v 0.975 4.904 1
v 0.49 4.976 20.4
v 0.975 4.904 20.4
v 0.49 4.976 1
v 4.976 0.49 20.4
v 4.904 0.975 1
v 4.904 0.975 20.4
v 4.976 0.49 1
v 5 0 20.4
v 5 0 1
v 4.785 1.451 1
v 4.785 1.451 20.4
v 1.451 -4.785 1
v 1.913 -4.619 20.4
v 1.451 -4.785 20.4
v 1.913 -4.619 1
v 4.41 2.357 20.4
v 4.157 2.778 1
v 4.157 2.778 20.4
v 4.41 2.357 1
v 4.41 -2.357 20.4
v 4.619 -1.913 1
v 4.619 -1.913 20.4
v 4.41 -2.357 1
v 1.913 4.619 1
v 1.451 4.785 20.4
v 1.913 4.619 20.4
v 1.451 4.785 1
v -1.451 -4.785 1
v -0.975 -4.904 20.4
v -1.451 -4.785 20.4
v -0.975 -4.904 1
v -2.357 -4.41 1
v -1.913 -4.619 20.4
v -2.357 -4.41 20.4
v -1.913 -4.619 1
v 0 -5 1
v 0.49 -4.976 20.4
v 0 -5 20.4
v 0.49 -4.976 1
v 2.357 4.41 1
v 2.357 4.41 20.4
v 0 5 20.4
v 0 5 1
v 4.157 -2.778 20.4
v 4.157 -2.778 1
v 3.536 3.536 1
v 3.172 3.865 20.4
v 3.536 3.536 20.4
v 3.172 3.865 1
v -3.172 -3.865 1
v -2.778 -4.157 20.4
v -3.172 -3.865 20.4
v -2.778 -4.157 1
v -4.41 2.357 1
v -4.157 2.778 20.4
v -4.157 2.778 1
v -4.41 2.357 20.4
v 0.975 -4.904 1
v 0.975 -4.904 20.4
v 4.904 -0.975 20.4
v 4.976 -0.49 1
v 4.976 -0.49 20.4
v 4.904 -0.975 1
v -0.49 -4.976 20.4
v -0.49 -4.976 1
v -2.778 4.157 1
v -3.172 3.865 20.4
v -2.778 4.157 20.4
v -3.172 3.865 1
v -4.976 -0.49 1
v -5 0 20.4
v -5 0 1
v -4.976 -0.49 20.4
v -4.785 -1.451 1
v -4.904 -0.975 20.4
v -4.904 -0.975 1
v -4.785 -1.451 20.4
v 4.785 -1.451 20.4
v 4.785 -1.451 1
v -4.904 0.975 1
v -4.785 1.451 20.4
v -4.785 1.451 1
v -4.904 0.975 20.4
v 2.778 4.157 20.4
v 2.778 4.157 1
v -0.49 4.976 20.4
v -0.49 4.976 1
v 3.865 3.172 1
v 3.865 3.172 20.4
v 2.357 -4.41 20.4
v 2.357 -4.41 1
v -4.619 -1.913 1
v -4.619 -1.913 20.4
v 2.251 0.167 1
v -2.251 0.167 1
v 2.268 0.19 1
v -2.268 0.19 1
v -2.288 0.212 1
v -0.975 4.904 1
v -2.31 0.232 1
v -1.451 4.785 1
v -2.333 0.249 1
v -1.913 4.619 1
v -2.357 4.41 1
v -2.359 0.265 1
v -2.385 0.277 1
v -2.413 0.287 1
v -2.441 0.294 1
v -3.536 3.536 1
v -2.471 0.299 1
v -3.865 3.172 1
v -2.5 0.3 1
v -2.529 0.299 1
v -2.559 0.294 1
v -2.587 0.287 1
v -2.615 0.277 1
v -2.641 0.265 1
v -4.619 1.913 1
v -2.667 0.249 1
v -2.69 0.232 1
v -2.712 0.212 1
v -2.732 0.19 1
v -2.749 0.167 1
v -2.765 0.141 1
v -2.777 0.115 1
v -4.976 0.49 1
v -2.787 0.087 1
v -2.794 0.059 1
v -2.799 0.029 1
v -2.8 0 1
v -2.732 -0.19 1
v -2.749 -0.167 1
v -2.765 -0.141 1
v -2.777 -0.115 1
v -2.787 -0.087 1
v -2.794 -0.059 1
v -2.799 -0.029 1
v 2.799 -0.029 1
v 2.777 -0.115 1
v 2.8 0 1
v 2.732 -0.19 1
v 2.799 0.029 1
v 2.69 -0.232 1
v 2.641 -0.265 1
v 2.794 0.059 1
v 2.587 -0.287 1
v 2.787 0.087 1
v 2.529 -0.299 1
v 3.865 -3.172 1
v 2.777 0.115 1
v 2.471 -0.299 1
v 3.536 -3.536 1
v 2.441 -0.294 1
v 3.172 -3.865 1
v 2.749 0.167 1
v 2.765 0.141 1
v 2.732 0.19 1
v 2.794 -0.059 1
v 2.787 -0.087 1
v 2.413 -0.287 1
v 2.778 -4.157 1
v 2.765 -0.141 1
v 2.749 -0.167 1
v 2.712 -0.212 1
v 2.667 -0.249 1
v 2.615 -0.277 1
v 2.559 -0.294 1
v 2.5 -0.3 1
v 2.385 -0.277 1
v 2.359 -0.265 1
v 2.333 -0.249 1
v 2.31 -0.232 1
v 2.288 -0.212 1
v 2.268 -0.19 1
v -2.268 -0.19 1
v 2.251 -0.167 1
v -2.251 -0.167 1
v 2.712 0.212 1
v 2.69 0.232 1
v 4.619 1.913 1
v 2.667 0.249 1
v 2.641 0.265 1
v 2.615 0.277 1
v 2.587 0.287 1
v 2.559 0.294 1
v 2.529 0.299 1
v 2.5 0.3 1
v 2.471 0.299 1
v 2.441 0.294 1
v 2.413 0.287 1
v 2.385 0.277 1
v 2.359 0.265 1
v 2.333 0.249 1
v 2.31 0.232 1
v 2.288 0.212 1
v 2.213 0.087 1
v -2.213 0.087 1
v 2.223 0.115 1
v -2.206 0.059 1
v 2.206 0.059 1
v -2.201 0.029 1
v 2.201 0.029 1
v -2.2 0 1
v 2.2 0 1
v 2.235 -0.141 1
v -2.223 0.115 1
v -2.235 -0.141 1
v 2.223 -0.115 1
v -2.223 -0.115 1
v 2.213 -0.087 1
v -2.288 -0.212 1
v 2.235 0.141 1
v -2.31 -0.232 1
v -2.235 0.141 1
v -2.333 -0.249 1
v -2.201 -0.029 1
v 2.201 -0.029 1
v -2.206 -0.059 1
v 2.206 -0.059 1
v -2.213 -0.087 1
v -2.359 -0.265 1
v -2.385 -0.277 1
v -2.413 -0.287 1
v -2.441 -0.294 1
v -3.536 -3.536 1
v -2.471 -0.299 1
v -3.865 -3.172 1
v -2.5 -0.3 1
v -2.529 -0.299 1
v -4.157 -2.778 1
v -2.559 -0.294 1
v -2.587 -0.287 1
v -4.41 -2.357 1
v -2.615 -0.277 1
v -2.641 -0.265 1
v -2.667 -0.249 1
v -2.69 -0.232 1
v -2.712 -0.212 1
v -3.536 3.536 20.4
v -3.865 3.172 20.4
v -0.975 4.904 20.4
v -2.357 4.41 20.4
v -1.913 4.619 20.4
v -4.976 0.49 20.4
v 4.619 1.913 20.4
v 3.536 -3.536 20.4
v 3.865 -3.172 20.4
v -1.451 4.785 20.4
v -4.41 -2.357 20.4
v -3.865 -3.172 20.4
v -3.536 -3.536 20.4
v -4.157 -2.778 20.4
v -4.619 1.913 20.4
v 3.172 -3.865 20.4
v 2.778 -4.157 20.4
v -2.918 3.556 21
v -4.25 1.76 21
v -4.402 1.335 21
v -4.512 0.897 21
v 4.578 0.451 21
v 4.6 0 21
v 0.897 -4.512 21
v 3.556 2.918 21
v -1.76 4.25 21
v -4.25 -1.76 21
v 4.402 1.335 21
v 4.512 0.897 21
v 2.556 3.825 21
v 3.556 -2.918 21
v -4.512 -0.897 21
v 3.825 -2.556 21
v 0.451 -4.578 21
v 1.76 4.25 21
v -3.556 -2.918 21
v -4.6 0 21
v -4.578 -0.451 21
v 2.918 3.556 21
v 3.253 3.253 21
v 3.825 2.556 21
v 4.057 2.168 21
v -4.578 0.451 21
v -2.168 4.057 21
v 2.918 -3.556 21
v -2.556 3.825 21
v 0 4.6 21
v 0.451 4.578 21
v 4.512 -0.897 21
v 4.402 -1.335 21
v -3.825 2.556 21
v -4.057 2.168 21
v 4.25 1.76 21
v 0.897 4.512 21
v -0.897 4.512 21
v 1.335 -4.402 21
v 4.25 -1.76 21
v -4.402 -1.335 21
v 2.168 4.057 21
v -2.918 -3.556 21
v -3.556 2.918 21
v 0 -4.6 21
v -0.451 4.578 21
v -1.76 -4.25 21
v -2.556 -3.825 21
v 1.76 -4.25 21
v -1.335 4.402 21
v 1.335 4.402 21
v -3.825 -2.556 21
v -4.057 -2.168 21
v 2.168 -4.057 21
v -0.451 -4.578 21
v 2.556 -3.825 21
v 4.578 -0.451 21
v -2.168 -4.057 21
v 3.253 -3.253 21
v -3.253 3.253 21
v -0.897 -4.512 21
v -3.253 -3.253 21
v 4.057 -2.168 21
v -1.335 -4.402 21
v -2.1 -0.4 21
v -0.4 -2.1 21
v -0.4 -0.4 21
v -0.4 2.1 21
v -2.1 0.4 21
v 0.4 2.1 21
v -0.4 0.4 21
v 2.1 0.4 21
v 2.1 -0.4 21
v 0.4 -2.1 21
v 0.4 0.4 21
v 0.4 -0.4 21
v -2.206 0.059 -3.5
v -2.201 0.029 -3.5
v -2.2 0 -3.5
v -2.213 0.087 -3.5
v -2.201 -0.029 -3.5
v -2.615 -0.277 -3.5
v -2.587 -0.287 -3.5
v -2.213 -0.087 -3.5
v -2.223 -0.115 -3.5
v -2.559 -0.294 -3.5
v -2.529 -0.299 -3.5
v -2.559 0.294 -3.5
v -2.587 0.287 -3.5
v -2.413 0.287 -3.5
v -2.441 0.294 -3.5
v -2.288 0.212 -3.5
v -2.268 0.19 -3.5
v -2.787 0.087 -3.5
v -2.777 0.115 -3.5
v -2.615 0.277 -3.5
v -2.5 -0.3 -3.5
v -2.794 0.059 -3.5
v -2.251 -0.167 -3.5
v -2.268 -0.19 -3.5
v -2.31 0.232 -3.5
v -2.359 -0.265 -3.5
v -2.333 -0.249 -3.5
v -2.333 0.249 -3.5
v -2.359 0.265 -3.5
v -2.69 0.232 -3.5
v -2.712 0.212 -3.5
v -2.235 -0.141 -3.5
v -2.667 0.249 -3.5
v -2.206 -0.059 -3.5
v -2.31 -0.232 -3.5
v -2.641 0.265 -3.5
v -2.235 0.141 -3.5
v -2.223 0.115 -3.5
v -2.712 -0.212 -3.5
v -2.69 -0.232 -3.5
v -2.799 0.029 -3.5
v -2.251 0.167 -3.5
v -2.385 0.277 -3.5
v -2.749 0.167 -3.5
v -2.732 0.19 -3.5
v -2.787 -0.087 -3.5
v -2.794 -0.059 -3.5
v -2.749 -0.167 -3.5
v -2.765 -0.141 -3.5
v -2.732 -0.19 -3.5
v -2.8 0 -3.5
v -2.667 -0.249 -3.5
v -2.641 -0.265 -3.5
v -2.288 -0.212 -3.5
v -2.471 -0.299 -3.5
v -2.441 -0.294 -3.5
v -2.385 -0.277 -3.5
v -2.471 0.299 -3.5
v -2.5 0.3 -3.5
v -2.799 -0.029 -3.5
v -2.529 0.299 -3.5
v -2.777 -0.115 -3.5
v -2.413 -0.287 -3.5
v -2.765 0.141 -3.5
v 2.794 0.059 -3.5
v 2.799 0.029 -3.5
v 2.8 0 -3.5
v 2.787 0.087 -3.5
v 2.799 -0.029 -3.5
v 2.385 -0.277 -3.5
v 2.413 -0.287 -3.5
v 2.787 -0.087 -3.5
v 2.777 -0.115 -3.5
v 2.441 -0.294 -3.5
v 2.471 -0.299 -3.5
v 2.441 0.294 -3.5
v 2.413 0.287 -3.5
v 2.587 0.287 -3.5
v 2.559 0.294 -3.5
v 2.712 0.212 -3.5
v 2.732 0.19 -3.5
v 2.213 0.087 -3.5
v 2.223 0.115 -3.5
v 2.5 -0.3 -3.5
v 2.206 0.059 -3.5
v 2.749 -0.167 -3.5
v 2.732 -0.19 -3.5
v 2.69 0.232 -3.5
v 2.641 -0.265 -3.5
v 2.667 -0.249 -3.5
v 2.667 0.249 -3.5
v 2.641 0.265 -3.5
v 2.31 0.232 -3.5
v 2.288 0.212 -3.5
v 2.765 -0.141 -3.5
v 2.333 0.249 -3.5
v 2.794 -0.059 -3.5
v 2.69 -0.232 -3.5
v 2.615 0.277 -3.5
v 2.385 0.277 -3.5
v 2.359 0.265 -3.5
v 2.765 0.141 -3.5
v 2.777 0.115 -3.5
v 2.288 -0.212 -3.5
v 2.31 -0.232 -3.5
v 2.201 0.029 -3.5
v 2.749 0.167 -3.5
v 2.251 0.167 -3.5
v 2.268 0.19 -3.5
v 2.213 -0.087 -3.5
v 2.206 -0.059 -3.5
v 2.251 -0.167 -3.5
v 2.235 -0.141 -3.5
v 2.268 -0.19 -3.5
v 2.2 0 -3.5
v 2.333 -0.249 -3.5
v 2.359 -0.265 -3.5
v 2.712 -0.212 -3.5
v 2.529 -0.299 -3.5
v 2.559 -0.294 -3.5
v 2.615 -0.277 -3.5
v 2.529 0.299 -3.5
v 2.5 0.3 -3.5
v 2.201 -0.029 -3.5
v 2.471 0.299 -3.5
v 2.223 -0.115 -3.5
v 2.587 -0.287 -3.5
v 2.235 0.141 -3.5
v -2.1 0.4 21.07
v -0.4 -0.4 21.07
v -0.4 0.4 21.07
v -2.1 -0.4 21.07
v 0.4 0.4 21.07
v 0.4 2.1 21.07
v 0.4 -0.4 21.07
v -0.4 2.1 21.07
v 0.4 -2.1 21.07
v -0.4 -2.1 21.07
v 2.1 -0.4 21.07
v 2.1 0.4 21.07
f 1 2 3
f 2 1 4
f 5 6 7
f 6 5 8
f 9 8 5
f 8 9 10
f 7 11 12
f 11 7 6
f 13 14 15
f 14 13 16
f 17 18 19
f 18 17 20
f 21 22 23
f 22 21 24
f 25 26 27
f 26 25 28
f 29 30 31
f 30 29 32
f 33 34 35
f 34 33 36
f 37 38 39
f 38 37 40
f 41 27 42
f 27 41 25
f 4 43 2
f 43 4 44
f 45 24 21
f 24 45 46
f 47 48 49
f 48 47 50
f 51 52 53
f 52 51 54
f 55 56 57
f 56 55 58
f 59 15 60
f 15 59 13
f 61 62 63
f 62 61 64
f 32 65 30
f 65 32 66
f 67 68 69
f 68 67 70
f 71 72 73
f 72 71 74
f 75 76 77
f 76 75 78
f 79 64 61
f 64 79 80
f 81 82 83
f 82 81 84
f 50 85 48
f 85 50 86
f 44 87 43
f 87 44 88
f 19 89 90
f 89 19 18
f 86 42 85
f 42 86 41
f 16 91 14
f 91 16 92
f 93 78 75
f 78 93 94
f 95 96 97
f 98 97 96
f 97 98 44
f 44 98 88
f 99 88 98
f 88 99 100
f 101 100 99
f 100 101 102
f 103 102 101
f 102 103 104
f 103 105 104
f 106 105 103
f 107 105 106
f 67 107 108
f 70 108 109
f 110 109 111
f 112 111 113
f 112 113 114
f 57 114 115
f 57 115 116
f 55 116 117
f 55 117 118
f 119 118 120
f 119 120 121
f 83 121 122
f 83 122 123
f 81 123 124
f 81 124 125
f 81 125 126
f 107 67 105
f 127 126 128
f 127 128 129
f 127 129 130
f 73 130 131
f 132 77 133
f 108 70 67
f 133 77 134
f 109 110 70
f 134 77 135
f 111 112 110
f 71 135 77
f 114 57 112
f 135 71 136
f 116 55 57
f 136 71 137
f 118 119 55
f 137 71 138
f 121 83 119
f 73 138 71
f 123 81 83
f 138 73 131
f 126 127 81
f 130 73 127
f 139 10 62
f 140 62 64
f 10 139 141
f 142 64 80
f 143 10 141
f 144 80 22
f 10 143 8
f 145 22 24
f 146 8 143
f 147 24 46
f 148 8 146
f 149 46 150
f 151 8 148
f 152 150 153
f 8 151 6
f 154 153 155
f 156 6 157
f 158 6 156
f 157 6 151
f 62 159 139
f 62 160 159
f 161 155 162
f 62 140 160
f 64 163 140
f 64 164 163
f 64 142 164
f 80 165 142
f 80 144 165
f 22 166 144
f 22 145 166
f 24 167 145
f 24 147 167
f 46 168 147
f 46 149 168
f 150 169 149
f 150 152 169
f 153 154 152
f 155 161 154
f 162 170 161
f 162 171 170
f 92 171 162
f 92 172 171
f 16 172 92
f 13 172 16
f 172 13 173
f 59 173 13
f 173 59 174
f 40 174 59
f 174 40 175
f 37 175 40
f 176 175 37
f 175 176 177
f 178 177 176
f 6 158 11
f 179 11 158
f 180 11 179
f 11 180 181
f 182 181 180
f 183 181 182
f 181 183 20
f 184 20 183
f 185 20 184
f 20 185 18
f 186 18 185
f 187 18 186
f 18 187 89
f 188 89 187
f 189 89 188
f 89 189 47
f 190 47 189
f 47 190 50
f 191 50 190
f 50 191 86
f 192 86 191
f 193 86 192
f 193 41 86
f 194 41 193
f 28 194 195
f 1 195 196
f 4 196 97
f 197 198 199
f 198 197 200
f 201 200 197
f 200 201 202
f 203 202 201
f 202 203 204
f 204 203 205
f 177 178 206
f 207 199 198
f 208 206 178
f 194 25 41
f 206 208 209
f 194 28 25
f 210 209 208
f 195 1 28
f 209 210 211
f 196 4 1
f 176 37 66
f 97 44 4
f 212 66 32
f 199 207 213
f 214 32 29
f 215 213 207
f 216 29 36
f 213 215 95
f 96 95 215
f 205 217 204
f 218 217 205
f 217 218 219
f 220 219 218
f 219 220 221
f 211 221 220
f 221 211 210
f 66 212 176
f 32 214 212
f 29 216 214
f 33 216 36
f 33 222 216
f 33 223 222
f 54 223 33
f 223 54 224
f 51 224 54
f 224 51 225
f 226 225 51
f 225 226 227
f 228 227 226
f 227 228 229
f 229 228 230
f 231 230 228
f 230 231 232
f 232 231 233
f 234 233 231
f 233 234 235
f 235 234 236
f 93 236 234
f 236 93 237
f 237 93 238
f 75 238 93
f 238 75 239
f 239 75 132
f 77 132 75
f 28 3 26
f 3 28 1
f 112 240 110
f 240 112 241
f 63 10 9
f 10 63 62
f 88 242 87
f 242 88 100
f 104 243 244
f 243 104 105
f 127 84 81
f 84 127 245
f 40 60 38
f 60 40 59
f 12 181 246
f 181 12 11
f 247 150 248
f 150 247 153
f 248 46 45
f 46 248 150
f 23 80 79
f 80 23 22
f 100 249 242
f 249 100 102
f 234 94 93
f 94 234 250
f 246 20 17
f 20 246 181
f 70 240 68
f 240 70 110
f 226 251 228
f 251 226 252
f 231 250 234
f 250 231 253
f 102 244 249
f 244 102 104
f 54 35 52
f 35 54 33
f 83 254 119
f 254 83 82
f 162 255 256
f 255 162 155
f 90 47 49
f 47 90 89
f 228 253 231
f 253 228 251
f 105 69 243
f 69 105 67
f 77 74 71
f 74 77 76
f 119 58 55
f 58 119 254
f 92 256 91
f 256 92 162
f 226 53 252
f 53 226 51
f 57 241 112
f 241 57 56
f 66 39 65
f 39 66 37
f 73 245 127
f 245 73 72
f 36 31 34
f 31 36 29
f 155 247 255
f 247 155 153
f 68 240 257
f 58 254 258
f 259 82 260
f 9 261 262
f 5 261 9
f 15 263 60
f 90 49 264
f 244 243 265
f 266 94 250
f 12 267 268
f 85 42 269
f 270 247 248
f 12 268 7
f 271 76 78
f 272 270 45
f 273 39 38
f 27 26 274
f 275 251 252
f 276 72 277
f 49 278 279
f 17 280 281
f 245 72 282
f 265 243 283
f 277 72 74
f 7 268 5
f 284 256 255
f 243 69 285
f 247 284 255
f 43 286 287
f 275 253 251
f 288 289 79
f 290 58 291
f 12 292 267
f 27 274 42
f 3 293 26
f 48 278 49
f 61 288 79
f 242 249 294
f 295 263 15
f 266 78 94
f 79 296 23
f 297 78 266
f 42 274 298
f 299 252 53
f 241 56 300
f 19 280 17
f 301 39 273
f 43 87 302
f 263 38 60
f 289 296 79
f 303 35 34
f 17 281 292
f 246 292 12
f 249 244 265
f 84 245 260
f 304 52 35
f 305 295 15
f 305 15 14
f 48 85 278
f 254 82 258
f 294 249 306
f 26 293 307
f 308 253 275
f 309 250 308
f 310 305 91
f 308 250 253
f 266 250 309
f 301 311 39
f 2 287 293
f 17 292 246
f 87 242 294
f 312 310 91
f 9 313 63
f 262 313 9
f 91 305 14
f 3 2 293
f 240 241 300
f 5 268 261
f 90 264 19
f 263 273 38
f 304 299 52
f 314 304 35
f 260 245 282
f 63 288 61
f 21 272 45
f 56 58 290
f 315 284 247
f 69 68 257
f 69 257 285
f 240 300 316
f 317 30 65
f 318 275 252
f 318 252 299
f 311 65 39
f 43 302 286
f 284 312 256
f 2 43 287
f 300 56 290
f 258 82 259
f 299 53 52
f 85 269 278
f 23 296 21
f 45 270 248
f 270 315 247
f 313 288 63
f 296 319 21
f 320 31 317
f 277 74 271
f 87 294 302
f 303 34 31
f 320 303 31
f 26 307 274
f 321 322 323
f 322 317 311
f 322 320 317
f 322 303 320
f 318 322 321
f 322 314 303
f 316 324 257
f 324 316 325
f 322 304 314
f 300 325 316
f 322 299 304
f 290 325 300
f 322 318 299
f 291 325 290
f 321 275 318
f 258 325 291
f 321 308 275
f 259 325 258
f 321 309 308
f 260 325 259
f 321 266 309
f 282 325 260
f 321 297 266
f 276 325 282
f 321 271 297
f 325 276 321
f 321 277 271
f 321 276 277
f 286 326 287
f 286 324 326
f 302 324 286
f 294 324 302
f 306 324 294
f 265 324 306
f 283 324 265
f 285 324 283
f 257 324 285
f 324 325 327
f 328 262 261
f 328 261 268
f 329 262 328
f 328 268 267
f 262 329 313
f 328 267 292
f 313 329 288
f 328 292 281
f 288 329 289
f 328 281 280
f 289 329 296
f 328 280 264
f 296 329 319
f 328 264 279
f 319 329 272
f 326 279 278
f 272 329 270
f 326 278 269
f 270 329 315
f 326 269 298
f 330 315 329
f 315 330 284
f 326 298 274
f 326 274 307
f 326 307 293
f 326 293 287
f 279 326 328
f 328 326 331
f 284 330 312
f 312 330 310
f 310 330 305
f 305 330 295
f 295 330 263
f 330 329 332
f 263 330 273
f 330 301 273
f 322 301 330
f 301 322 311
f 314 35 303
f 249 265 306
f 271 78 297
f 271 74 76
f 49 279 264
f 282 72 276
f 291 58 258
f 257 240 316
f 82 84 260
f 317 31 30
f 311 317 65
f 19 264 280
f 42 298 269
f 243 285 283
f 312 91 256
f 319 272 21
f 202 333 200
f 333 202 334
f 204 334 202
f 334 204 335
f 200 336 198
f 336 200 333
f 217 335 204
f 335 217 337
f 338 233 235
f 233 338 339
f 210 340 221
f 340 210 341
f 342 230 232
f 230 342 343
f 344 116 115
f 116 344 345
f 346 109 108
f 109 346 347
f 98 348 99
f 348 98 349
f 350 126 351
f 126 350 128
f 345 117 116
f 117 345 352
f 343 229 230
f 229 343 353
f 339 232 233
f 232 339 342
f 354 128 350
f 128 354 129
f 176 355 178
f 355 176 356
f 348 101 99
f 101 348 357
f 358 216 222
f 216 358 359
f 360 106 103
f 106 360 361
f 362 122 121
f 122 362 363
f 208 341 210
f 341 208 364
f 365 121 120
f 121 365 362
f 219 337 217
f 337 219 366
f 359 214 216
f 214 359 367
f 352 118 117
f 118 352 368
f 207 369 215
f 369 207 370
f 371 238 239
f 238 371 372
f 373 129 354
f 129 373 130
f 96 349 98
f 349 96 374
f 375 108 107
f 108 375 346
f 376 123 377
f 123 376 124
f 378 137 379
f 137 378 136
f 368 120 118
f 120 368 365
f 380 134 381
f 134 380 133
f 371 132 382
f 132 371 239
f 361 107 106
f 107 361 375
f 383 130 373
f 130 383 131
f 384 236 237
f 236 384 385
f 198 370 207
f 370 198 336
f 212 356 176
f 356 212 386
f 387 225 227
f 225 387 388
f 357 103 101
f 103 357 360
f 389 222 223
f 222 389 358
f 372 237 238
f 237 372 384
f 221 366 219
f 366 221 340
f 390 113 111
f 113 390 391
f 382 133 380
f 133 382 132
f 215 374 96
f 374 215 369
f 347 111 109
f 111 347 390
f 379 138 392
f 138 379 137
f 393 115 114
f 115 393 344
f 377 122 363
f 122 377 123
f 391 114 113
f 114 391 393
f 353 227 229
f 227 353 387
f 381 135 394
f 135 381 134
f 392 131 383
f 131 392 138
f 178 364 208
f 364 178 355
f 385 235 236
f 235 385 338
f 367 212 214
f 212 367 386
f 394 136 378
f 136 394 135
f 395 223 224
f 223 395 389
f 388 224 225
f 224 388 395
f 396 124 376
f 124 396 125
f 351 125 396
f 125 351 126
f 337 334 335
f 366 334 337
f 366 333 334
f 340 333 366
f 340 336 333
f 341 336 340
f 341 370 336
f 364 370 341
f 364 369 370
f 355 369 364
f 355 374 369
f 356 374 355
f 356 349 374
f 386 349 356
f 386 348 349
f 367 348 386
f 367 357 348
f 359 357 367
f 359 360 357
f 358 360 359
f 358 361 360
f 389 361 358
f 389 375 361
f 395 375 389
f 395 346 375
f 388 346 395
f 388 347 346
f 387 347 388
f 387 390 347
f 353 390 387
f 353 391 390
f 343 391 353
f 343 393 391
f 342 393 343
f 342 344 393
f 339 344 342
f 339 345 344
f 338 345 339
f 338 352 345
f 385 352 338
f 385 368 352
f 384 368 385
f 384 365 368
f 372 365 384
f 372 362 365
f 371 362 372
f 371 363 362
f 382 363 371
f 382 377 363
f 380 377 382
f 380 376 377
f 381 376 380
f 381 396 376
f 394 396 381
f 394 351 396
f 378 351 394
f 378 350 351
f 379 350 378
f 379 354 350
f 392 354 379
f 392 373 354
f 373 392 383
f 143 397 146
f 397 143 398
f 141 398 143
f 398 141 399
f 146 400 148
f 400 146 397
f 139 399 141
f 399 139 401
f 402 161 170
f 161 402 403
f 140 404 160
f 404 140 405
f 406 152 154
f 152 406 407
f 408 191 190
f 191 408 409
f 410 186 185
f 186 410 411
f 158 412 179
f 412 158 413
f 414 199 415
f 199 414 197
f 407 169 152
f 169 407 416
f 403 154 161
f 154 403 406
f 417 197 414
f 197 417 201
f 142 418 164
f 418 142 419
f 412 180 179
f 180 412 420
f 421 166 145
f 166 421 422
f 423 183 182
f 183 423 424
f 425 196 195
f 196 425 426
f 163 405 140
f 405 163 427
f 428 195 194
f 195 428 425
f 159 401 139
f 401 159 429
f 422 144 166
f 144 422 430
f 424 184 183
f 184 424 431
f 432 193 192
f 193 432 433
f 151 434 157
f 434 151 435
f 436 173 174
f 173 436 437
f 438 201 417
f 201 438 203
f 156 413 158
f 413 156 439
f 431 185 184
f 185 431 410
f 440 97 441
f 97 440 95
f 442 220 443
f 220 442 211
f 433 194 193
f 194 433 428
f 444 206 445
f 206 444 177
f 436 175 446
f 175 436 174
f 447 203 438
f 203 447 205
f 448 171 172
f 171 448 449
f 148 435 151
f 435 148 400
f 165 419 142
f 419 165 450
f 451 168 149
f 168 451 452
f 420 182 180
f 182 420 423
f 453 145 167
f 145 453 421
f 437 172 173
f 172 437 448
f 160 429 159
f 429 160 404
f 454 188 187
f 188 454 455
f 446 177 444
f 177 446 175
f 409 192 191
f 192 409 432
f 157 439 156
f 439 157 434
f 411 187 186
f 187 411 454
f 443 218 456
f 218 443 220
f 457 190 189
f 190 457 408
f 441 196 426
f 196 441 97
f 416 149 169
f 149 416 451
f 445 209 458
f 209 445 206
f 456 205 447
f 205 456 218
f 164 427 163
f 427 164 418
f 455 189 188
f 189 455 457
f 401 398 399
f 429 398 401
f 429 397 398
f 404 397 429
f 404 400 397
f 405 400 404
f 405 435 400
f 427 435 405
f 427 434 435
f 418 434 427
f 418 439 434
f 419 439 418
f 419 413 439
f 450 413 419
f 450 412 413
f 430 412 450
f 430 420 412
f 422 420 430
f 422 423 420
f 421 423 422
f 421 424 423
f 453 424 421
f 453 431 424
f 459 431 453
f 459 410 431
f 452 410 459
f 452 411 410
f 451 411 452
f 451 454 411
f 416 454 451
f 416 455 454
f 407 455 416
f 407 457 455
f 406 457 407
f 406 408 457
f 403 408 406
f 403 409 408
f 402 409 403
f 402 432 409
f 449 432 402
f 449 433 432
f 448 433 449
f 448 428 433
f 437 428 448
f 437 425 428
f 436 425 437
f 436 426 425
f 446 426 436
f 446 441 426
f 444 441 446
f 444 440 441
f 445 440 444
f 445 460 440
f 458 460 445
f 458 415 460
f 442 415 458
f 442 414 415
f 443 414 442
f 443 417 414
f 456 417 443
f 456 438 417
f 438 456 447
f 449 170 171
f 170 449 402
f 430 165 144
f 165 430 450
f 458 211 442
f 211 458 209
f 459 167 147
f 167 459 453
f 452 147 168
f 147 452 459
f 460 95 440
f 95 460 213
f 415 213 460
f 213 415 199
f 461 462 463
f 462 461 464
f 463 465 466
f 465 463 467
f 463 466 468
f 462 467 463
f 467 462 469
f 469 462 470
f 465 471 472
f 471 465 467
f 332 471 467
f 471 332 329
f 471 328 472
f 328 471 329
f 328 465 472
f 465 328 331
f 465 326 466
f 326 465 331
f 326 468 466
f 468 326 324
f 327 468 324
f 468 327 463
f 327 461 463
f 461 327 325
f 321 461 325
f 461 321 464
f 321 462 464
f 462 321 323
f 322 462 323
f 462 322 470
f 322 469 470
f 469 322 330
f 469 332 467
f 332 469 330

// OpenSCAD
$fn = 64;

body_diameter = 10;
body_height = 20;
lead_spacing = 5;
lead_diameter = 0.6;
lead_length_below = 3.5;
body_lift = 1;
lead_stub = 1;
top_chamfer = 0.6;

module lead(x) {
    color([0.75, 0.75, 0.75])
    translate([x, 0, -lead_length_below])
        cylinder(h = lead_length_below + body_lift + lead_stub, d = lead_diameter);
}

module capacitor_body() {
    color([0.16, 0.18, 0.19])
    union() {
        translate([0, 0, body_lift])
            cylinder(h = body_height - top_chamfer, d = body_diameter);
        translate([0, 0, body_lift + body_height - top_chamfer])
            cylinder(h = top_chamfer, d1 = body_diameter, d2 = body_diameter * 0.92);
    }
}

module top_vent() {
    color([0.78, 0.78, 0.78])
    translate([0, 0, body_lift + body_height - 0.05])
    linear_extrude(height = 0.12)
    union() {
        square([body_diameter * 0.42, body_diameter * 0.08], center = true);
        square([body_diameter * 0.08, body_diameter * 0.42], center = true);
    }
}

lead(-lead_spacing / 2);
lead( lead_spacing / 2);
capacitor_body();
top_vent();
